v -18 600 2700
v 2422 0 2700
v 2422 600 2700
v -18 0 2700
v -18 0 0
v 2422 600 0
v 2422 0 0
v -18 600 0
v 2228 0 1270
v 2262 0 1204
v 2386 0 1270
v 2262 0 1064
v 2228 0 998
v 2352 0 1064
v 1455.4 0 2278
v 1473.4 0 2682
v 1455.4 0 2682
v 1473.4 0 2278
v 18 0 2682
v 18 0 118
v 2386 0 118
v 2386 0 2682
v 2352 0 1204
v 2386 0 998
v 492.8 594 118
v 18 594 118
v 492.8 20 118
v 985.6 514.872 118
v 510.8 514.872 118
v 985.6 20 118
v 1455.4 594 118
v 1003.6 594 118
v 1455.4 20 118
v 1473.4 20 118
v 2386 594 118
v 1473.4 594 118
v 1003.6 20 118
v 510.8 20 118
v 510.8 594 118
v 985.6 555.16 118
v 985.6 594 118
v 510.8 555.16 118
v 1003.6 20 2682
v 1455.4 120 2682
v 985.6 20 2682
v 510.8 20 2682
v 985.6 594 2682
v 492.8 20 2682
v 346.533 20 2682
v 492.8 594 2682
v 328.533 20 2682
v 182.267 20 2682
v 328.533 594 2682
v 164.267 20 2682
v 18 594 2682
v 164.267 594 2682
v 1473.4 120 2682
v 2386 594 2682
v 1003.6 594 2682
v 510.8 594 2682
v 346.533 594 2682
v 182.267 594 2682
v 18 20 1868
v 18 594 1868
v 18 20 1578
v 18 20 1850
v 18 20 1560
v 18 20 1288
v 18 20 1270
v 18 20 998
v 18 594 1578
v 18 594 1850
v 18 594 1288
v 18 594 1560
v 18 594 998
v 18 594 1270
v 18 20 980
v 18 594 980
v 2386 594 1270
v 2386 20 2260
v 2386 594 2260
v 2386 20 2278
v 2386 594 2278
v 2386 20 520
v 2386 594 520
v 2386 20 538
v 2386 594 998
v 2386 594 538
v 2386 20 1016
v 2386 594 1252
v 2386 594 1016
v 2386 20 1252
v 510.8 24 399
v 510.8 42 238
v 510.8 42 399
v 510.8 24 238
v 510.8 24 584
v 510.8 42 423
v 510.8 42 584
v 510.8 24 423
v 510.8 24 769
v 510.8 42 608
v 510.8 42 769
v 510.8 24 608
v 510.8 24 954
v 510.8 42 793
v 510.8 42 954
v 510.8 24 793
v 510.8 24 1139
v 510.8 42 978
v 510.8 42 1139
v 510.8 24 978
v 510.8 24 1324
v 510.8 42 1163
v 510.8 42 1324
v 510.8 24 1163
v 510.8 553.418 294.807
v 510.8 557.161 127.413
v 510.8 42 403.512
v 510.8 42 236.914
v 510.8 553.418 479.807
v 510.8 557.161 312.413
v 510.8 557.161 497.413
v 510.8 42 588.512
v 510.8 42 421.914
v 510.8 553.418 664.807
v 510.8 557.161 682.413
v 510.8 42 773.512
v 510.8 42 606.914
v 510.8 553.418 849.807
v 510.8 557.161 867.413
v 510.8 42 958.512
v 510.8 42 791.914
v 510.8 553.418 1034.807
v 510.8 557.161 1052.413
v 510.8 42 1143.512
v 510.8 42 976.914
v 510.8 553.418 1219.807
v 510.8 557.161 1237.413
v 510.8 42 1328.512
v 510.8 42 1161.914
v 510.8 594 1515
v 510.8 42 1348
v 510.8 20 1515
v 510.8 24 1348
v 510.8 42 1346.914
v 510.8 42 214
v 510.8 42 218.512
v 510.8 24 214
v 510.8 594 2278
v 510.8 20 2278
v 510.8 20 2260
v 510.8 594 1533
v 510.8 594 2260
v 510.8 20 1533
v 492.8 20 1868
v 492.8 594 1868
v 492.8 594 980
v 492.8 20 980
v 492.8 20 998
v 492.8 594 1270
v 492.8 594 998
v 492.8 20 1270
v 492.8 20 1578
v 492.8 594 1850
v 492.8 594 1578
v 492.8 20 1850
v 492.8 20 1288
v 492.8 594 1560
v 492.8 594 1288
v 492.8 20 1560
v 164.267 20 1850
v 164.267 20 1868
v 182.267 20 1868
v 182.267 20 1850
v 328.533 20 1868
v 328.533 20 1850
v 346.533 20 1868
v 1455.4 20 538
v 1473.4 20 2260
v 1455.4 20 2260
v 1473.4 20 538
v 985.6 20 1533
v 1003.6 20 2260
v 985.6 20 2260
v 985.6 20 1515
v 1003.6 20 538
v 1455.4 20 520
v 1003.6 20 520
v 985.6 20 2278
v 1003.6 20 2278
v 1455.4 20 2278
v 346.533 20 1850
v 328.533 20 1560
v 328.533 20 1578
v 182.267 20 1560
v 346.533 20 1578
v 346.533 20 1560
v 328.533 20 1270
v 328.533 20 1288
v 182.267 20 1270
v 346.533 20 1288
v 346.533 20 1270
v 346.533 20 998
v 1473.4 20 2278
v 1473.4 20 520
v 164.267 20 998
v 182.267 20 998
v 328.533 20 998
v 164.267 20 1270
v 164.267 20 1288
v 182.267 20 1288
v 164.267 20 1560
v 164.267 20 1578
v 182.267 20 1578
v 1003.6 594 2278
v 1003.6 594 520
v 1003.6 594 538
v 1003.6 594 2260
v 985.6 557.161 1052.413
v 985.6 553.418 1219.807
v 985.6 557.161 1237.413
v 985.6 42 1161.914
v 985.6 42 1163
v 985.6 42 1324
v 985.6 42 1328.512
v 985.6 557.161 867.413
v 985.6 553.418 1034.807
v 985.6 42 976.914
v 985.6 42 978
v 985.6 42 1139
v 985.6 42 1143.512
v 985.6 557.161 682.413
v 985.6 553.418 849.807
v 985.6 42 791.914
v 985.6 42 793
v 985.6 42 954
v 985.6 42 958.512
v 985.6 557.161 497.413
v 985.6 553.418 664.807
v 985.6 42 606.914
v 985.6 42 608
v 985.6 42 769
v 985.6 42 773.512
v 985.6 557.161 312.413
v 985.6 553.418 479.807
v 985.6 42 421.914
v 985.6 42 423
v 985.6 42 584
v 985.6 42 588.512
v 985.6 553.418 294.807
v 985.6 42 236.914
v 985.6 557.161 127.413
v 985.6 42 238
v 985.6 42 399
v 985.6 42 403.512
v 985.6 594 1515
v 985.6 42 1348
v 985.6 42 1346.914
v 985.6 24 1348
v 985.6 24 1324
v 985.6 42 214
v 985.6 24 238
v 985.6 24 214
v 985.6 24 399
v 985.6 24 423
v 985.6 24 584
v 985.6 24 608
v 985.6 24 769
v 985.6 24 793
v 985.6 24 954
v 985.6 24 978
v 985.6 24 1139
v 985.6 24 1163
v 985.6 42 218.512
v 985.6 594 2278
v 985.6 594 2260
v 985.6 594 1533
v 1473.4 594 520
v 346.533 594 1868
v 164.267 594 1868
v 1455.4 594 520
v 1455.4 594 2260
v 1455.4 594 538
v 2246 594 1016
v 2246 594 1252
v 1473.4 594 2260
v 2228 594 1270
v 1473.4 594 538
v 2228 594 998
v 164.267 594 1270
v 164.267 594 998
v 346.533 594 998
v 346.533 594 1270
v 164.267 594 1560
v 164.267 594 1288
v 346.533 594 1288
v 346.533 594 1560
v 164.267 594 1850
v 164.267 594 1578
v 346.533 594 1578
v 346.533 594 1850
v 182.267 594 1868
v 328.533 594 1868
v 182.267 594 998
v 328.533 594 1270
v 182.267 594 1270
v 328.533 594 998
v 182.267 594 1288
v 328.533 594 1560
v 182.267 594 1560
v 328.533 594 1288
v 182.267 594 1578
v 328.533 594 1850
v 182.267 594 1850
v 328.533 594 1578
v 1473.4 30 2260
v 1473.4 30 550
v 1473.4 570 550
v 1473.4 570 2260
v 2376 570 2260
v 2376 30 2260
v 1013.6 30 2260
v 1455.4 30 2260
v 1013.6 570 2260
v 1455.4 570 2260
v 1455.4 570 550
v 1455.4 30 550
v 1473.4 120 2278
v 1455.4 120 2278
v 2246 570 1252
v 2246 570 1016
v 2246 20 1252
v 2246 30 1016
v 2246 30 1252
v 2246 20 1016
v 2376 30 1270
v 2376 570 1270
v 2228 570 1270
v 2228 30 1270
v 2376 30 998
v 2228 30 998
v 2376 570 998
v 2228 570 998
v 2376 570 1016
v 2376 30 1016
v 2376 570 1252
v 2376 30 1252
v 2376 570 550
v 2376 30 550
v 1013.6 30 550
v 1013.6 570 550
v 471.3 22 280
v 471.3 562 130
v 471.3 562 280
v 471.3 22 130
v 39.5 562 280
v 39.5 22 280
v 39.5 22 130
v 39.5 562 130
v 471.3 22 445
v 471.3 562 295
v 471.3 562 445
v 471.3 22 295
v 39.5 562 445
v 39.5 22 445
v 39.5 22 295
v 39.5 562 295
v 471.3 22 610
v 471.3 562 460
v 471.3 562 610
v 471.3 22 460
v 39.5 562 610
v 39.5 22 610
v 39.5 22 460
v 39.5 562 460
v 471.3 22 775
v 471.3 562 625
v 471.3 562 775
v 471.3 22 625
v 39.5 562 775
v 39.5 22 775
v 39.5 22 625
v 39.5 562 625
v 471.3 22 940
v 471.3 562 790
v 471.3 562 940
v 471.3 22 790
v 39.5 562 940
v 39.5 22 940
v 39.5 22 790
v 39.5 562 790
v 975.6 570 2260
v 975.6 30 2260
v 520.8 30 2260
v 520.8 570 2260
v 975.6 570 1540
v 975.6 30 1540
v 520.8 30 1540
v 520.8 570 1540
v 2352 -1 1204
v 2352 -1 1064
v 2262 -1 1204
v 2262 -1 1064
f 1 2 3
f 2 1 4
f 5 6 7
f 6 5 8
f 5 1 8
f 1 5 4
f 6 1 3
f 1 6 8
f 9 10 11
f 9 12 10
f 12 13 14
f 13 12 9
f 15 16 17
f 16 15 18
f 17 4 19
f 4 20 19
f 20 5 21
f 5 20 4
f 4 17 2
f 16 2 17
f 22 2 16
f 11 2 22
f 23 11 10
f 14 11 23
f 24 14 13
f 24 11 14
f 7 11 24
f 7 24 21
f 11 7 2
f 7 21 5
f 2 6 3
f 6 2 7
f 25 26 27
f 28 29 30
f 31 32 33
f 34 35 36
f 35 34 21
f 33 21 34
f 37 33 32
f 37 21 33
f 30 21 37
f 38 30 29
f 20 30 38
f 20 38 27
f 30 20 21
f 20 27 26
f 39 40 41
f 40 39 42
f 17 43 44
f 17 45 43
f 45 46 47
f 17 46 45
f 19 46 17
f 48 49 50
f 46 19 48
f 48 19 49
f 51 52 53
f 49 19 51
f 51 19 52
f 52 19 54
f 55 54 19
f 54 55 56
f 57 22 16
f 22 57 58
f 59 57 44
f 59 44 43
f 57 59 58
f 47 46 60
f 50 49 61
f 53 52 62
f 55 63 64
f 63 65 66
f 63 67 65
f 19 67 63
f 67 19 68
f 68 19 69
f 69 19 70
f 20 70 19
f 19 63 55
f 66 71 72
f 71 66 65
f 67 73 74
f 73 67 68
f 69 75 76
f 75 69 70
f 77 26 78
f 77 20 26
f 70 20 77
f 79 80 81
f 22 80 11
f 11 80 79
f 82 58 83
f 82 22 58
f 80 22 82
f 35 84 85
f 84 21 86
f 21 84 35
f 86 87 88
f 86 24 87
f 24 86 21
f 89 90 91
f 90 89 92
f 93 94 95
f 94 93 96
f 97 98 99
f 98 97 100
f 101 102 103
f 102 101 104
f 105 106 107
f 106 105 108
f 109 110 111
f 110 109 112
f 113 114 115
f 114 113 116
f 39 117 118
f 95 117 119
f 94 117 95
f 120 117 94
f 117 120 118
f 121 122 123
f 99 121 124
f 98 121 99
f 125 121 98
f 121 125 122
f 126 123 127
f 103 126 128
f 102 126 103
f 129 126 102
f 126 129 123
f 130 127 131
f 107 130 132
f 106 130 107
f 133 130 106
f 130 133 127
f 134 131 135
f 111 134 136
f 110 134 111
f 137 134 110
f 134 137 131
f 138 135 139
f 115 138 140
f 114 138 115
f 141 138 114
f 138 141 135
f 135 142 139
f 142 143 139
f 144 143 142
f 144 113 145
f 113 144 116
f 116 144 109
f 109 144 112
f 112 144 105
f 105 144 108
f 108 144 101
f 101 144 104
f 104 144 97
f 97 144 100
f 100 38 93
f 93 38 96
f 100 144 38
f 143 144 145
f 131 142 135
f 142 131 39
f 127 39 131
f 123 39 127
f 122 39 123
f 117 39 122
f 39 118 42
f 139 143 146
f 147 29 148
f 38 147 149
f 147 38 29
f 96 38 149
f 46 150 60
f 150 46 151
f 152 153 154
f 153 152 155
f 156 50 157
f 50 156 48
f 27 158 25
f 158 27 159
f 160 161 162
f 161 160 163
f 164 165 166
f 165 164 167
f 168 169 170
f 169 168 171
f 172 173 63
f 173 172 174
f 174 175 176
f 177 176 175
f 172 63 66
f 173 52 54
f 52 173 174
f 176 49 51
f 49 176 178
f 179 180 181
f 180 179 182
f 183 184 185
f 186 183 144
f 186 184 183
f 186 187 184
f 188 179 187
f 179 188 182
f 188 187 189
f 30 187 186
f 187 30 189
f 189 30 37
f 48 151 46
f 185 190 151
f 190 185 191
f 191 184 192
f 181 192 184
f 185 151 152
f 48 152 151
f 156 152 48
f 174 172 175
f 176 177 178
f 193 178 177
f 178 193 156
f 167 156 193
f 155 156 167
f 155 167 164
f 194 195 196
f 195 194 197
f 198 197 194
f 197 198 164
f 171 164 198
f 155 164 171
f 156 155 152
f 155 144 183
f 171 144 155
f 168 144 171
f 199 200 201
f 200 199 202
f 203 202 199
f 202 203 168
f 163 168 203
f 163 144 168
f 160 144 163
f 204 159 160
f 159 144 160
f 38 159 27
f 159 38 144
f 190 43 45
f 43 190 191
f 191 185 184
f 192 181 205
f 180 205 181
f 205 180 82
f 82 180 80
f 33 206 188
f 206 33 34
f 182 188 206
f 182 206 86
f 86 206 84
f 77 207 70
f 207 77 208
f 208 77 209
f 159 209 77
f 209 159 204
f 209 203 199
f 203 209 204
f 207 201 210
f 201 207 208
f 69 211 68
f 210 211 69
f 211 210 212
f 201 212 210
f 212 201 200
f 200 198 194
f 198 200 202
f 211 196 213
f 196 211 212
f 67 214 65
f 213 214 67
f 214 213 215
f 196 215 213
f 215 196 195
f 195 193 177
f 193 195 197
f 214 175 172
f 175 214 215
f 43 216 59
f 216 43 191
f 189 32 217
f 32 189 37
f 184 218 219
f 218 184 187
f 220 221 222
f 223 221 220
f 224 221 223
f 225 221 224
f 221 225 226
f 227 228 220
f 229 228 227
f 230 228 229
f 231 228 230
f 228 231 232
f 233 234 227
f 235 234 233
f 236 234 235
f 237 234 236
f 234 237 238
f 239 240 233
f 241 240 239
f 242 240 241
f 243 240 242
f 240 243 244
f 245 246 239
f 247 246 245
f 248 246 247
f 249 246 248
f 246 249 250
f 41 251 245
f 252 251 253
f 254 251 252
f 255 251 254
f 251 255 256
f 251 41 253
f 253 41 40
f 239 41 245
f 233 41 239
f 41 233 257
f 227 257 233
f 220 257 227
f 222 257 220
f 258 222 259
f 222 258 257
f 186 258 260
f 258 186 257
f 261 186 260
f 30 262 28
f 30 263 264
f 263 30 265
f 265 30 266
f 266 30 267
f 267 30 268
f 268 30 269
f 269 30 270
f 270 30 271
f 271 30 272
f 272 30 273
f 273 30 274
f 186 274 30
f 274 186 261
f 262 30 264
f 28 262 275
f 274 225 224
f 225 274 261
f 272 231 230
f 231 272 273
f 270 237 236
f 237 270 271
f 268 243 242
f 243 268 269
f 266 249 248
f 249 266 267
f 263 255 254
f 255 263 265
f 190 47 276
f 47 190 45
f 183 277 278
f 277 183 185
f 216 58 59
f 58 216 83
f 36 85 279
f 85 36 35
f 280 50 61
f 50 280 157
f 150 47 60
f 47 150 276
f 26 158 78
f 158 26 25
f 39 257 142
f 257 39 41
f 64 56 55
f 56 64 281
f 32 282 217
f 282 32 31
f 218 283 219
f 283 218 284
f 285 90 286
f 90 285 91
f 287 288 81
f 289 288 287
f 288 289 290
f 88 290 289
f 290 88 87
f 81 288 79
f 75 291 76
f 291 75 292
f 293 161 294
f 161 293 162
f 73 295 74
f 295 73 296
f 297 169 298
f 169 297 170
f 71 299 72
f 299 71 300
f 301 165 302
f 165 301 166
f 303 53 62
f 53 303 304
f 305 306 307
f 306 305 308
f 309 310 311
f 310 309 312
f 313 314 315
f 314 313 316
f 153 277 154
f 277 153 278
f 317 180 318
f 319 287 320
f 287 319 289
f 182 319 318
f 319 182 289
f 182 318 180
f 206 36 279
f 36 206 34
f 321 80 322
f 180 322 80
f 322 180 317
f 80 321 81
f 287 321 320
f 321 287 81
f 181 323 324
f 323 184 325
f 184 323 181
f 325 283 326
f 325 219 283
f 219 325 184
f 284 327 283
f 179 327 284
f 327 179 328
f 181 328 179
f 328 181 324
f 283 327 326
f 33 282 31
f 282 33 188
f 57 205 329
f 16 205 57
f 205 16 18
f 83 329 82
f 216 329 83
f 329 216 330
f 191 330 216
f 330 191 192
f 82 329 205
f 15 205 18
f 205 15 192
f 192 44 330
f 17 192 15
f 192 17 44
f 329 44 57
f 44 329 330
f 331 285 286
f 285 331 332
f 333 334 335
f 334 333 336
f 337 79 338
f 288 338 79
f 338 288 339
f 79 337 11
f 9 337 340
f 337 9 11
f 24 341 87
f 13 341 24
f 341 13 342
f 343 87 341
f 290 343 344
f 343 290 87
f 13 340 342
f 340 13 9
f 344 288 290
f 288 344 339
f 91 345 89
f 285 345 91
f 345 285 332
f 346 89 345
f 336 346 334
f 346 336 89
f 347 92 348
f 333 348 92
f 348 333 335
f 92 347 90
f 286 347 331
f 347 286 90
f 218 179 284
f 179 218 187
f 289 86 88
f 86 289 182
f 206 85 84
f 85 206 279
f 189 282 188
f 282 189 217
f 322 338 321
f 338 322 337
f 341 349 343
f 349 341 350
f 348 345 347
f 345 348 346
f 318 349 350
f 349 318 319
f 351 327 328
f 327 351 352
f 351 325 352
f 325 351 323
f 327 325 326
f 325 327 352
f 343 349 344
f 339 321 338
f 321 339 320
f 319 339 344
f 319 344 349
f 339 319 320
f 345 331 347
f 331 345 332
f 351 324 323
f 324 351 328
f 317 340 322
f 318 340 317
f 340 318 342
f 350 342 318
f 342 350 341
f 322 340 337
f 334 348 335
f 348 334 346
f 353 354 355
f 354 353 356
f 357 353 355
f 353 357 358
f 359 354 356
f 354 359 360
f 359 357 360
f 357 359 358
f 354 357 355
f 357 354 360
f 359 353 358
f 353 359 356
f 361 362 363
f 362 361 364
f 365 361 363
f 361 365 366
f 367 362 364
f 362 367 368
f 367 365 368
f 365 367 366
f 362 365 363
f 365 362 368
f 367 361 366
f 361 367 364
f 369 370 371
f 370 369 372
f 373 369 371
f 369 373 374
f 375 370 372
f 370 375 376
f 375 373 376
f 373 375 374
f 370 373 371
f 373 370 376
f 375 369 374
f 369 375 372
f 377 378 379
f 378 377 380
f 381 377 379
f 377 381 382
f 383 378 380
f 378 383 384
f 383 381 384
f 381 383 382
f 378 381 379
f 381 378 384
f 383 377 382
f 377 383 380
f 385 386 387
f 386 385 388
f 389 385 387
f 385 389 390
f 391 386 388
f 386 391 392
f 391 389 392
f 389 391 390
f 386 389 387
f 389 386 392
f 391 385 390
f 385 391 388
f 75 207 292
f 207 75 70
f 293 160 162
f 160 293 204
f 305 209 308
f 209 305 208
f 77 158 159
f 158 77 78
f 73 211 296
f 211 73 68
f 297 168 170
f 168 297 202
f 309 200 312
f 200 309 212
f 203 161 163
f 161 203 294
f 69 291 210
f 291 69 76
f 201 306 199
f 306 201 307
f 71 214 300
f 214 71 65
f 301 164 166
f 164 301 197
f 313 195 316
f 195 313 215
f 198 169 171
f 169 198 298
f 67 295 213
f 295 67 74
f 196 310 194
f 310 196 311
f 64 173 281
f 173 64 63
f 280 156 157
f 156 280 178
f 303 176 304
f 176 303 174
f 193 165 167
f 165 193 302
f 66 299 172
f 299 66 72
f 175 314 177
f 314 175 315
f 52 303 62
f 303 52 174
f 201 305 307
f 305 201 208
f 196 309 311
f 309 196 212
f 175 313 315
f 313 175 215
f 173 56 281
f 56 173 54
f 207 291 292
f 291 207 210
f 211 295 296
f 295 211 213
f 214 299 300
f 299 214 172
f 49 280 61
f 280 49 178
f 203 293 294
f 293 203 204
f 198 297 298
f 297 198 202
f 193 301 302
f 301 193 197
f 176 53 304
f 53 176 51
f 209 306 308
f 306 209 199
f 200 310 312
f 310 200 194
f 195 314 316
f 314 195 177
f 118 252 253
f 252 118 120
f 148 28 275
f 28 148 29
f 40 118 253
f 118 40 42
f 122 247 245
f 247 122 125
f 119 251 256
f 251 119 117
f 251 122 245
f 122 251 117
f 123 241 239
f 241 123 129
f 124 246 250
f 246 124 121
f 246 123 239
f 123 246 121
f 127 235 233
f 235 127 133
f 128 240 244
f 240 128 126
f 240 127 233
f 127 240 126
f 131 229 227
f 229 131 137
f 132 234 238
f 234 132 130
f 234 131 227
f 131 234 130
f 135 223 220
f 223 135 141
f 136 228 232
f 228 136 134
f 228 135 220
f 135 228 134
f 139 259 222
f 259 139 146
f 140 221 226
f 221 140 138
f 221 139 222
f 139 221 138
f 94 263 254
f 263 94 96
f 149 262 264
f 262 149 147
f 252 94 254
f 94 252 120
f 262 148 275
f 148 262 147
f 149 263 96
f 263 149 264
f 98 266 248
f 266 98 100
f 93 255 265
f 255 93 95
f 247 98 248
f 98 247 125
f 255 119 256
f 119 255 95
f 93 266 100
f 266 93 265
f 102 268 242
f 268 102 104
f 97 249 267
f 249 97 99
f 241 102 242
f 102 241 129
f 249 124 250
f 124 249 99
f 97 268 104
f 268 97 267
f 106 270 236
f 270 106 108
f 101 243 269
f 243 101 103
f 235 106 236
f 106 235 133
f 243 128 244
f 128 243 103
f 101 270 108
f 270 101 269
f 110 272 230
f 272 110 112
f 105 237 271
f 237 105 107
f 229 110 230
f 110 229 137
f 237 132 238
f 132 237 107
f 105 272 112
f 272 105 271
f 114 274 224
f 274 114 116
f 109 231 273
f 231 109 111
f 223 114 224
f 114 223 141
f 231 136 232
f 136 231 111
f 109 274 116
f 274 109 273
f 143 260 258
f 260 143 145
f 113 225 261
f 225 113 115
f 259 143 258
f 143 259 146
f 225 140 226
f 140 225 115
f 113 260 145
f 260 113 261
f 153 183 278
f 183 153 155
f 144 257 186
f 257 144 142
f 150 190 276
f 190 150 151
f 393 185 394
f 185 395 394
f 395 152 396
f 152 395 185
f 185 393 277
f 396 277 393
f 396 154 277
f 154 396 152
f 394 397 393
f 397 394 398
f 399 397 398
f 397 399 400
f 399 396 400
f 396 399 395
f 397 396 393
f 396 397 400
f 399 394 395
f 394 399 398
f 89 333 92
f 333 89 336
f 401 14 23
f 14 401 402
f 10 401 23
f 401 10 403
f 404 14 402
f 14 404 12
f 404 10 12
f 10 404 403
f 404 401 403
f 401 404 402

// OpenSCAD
$fn = 48;

// Előszoba szekrény - koncepció modell
// Külső méret: 2400 x 600 x 2800 mm
// A kapcsolólap a jobb oldali kabátos részhez csatlakozó külön dobozban helyezkedik el

material = 18;
side_cover_th = material;
width_total = 2440;
depth_total = 600;
height_total = 2700;
plinth_h = 100;

cabinet_w = width_total;
inner_cabinet_w = width_total - 2 * side_cover_th;
outer_left_x = -side_cover_th;
outer_right_x = inner_cabinet_w + side_cover_th;
front_left_limit = material / 2;
front_right_limit = inner_cabinet_w - material / 2;

door_gap = 3;
door_th = 20;
rod_d = 30;
rod_y = depth_total / 2;

// Fix funkcionális magasságok: ezek nem skálázódnak a teljes magassággal
hanging_bench_z = plinth_h + 420;
hanging_rod_z = 1960;
hanging_top_shelf_z = 2260;

shoe_start_z = plinth_h + 120;
shoe_pitch = 185;
shoe_levels = 7;
shoe_split_z = 1580;
shoe_upper_rod_z = 1960;
shoe_top_shelf_z = 2260;

drawer_h = 150;
drawer_pitch = 165;
drawer_slide_total_w = 27;
acc_upper_start = 980;
acc_upper_pitch = 290;
switch_panel_h = acc_upper_pitch - material;
switch_panel_w = 140;
switch_panel_z0 = acc_upper_start + material;
switch_side_y = 120;
switch_box_w = switch_panel_w + material;

// A teljes méret változását a környező tárolóterek veszik fel
min_height_required = max(hanging_top_shelf_z + material + 100, acc_upper_start + 4 * acc_upper_pitch + material + 100);

// Új kiosztás a gyakorlatiasabb használathoz:
// 5 egyforma szélességű ajtó a homlokzaton:
// 3 ajtó a fő akasztós résznél, 1 a cipős résznél, 1 az accessory résznél
section_unit_w = (inner_cabinet_w - 8 * door_gap - 2 * material) / 5;
equal_door_w = (front_right_limit - front_left_limit - 4 * door_gap) / 5;
main_hanging_w = 3 * section_unit_w + 4 * door_gap;
shoe_w = section_unit_w + material + 2 * door_gap;
accessory_w = section_unit_w + material + 2 * door_gap;

assert(height_total >= min_height_required, "height_total tul kicsi a fix belso kiosztashoz");
assert(depth_total >= 450, "depth_total tul kicsi a jelenlegi funkciokhoz");
assert(section_unit_w >= 300, "width_total tul kicsi az 5 egyforma ajtos kiosztashoz");

carcass_col = [0.96, 0.96, 0.95];
shelf_col = [0.96, 0.96, 0.95];
plinth_col = [0.88, 0.88, 0.87];
back_col = [0.92, 0.90, 0.86];
metal = [0.62, 0.64, 0.68];
drawer_col = [0.78, 0.66, 0.48];
door_col = [0.88, 0.83, 0.75, 0.55];
panel_col = [0.95, 0.95, 0.95];
accent_col = [0.85, 0.90, 0.98, 0.12];

echo("Teljes szelesseg:", width_total, "mm");
echo("Kesz szekreny teljes szelesseg:", width_total, "mm");
echo("Belso korpusz szelesseg:", inner_cabinet_w, "mm");
echo("Egyforma ajtoszelesseg:", equal_door_w, "mm");
echo("Accessory resz bal legszelen:", accessory_w, "mm -> 1 ajto, kisebb fakkok + 5 fiok");
echo("Cipos resz kozepen:", shoe_w, "mm -> 1 ajto, 7 szint, felette kulon akasztos zona");
echo("Fo akasztos resz jobb oldalon:", main_hanging_w, "mm -> 3 egyforma ajto");
echo("Osszes kabattarolas: fo akasztos + jobb oldali felso akaszto");
echo("Sapka / sal / kesztyu tarolas: kisebb fakkok + 5 also fiok");

module board(size, col = shelf_col) {
    color(col) cube(size);
}

module inner_board(x, z, w, col = shelf_col) {
    translate([x, door_th, z]) board([w, depth_total - door_th, material], col);
}

module rod_with_mounts(x, y, z, span) {
    mount_d = rod_d + 10;
    mount_th = 6;

    color(metal)
    translate([x, y, z])
    rotate([0, 90, 0])
    cylinder(h = span, d = rod_d);

    // Bal oldali rögzítő talp
    color(metal)
    translate([x - mount_th, y - rod_d / 2, z - mount_d / 2])
    cube([mount_th, rod_d, mount_d]);

    // Jobb oldali rögzítő talp
    color(metal)
    translate([x + span, y - rod_d / 2, z - mount_d / 2])
    cube([mount_th, rod_d, mount_d]);
}

module carcass() {
    inner_h = height_total - plinth_h;
    inset_depth = depth_total - door_th;

    // Két külső takarólap a korpusz két oldalán
    translate([-side_cover_th, 0, 0]) board([side_cover_th, depth_total, height_total], carcass_col);
    translate([inner_cabinet_w, 0, 0]) board([side_cover_th, depth_total, height_total], carcass_col);

    board([inner_cabinet_w, depth_total, plinth_h], plinth_col);

    translate([0, 0, plinth_h]) board([inner_cabinet_w, depth_total, material], carcass_col);
    translate([0, 0, height_total - material]) board([inner_cabinet_w, depth_total, material], carcass_col);

    translate([0, 0, plinth_h]) board([material, depth_total, inner_h - material], carcass_col);
    translate([inner_cabinet_w - material, 0, plinth_h]) board([material, depth_total, inner_h - material], carcass_col);

    // A köztes függőleges korpuszelemek egy lapvastagsággal beljebb ülnek,
    // így az ajtók a nyílásba záródva rá tudnak feküdni ezekre.
    translate([accessory_w, door_th, plinth_h]) board([material, inset_depth, inner_h - material], carcass_col);
    translate([accessory_w + shoe_w, door_th, plinth_h]) board([material, inset_depth, inner_h - material], carcass_col);

    translate([0, depth_total - 6, plinth_h]) board([inner_cabinet_w, 6, inner_h - material], back_col);
}

module hanging_section() {
    x0 = accessory_w + shoe_w + material;
    clear_w = main_hanging_w - 2 * material;
    bay_w = clear_w / 3;
    upper_hinge_depth = 120;
    switch_box_x = x0 + clear_w - switch_box_w;

    // Egy valódi osztólap az első és a középső kabátajtó között
    translate([x0 + bay_w - material / 2, door_th, plinth_h + material])
    board([material, depth_total - door_th, hanging_top_shelf_z - plinth_h - material], shelf_col);

    // A bal oldali belső osztó fölött külön felső fogadóléc ad helyet a felső pántnak
    translate([x0 + bay_w - material / 2, 0, hanging_top_shelf_z + material])
    board([material, upper_hinge_depth, height_total - hanging_top_shelf_z - 2 * material], shelf_col);

    // Jobb oldali külön kapcsolódoboz, amely teljes mélységben a hátfalig ér
    translate([switch_box_x, 0, switch_panel_z0]) board([material, depth_total, switch_panel_h], shelf_col);
    translate([switch_box_x, 0, switch_panel_z0]) board([switch_box_w, depth_total, material], shelf_col);
    translate([switch_box_x, 0, switch_panel_z0 + switch_panel_h - material]) board([switch_box_w, depth_total, material], shelf_col);

    // Felső teljes szélességű polc sapkáknak, sálaknak, ritkábban használt holmiknak
    inner_board(x0, hanging_top_shelf_z, clear_w, shelf_col);

    // Bal oldali külön akasztórúd
    rod_with_mounts(x0 + 18, rod_y, hanging_rod_z, bay_w - 36);

    // Jobb oldali dupla szélességű akasztórúd
    rod_with_mounts(x0 + bay_w + 18, rod_y, hanging_rod_z, clear_w - bay_w - 36);

    // Pad / alsó polc táskának vagy leüléshez
    inner_board(x0, hanging_bench_z, clear_w, shelf_col);

    // Az alsó zóna nyitott marad ülőpadnak / táskának

    color(accent_col)
    translate([x0 + 10, 30, hanging_bench_z + 30])
    cube([clear_w - 20, depth_total - 60, hanging_top_shelf_z - (hanging_bench_z + 30)]);
}

module accessory_section() {
    x0 = material;
    clear_w = accessory_w - material;
    acc_comp_w = (clear_w - 2 * material) / 3;
    drawer_side_gap = 8;
    drawer_box_w = clear_w - 16 - drawer_slide_total_w;
    drawer_x = x0 + drawer_side_gap + drawer_slide_total_w / 2;

    // 5 kisebb fiók sapka / kesztyű / sál / kulcs / apróságok részére
    for (i = [0:4]) {
        z = plinth_h + 30 + i * drawer_pitch;
        color(drawer_col)
        translate([drawer_x, door_th + 2, z])
        cube([drawer_box_w, depth_total - door_th - 40, drawer_h]);
    }

    // Felső kisebb fakkok
    for (z = [acc_upper_start, acc_upper_start + acc_upper_pitch, acc_upper_start + 2 * acc_upper_pitch, acc_upper_start + 3 * acc_upper_pitch]) {
        inner_board(x0, z, clear_w, shelf_col);
    }

    // Két függőleges osztó a felső fakkokhoz, 3 egyforma rekeszt adva
    for (x = [x0 + acc_comp_w, x0 + 2 * acc_comp_w + material]) {
        translate([x, door_th, acc_upper_start])
        board([material, depth_total - door_th, height_total - material - acc_upper_start], shelf_col);
    }
}

module shoe_section() {
    x0 = accessory_w + material;
    clear_w = shoe_w - material;
    shelf_d = depth_total - 70;
    tilt = -12;

    // 7 döntött polc, szintenként kb. 5-6 pár cipővel számolva
    for (i = [0:shoe_levels - 1]) {
        translate([x0, 35, shoe_start_z + i * shoe_pitch])
        rotate([tilt, 0, 0])
        board([clear_w, shelf_d, material], shelf_col);
    }

    for (i = [0:shoe_levels - 1]) {
        translate([x0, 24, shoe_start_z + i * shoe_pitch - 6])
        board([clear_w, 18, 24], plinth_col);
    }

    // Felső külön kabáttartó rész rövidebb vagy vendégkabátoknak
    upper_shelf_z = shoe_start_z + shoe_levels * shoe_pitch;
    inner_board(x0, upper_shelf_z, clear_w, shelf_col);
    inner_board(x0, shoe_top_shelf_z, clear_w, shelf_col);

    rod_with_mounts(x0 + 18, rod_y, shoe_upper_rod_z, clear_w - 36);

    color(accent_col)
    translate([x0 + 10, 30, upper_shelf_z + 25])
    cube([clear_w - 20, depth_total - 60, shoe_top_shelf_z - (upper_shelf_z + 25)]);
}

module fronts() {
    // Az ajtók függőlegesen a nyílásba záródnak:
    // alul és felül beférnek a vízszintes korpuszelemek közé.
    z0 = plinth_h + material + door_gap;
    door_h = height_total - plinth_h - 2 * material - 2 * door_gap;
    function door_x(i) = front_left_limit + material + i * (equal_door_w + door_gap) + (i > 0 ? material : 0);

    // Accessory rész bal oldalon egy teljes ajtóval
    color(door_col)
    translate([door_x(0), 0, z0])
    cube([equal_door_w, door_th, door_h]);

    // Cipős rész középen egy ajtóval
    color(door_col)
    translate([door_x(1), 0, z0])
    cube([equal_door_w, door_th, door_h]);

    // Akasztós rész jobb oldalon: 3 db teljes magasságú ajtó
    single_hanging = equal_door_w;
    for (i = [0:1]) {
        x = door_x(i + 2);
        color(door_col)
        translate([x, 0, z0])
        cube([single_hanging, door_th, door_h]);
    }

    // Jobb szélső kabátos ajtó kivágással a switch panel dobozához
    right_door_x = door_x(4);
    cutout_w = switch_box_w;
    cutout_x = single_hanging - cutout_w;
    cutout_z = switch_panel_z0 - z0;
    color(door_col)
    translate([right_door_x, 0, z0])
    difference() {
        cube([single_hanging, door_th, door_h]);
        translate([cutout_x, -1, cutout_z])
        cube([cutout_w + 1, door_th + 2, switch_panel_h]);
    }
}

module switch_panel() {
    switch_box_front_x = accessory_w + shoe_w + material + (main_hanging_w - 2 * material) - switch_box_w;

    // A kapcsolópanel a kis doboz előlapján jelenik meg, a jobb szélső ajtó kivágása mögött
    color(panel_col)
    translate([switch_box_front_x, 0, switch_panel_z0])
    cube([switch_box_w, door_th, switch_panel_h]);

    // Kapcsoló szerelési zóna az előlap közepén
    color([0.82, 0.82, 0.82])
    translate([switch_box_front_x + switch_box_w / 2 - 45, -1, switch_panel_z0 + switch_panel_h / 2 - 70])
    cube([90, 2, 140]);
}

module wardrobe() {
    carcass();
    hanging_section();
    accessory_section();
    shoe_section();
    //fronts();
    switch_panel();
}

wardrobe();
